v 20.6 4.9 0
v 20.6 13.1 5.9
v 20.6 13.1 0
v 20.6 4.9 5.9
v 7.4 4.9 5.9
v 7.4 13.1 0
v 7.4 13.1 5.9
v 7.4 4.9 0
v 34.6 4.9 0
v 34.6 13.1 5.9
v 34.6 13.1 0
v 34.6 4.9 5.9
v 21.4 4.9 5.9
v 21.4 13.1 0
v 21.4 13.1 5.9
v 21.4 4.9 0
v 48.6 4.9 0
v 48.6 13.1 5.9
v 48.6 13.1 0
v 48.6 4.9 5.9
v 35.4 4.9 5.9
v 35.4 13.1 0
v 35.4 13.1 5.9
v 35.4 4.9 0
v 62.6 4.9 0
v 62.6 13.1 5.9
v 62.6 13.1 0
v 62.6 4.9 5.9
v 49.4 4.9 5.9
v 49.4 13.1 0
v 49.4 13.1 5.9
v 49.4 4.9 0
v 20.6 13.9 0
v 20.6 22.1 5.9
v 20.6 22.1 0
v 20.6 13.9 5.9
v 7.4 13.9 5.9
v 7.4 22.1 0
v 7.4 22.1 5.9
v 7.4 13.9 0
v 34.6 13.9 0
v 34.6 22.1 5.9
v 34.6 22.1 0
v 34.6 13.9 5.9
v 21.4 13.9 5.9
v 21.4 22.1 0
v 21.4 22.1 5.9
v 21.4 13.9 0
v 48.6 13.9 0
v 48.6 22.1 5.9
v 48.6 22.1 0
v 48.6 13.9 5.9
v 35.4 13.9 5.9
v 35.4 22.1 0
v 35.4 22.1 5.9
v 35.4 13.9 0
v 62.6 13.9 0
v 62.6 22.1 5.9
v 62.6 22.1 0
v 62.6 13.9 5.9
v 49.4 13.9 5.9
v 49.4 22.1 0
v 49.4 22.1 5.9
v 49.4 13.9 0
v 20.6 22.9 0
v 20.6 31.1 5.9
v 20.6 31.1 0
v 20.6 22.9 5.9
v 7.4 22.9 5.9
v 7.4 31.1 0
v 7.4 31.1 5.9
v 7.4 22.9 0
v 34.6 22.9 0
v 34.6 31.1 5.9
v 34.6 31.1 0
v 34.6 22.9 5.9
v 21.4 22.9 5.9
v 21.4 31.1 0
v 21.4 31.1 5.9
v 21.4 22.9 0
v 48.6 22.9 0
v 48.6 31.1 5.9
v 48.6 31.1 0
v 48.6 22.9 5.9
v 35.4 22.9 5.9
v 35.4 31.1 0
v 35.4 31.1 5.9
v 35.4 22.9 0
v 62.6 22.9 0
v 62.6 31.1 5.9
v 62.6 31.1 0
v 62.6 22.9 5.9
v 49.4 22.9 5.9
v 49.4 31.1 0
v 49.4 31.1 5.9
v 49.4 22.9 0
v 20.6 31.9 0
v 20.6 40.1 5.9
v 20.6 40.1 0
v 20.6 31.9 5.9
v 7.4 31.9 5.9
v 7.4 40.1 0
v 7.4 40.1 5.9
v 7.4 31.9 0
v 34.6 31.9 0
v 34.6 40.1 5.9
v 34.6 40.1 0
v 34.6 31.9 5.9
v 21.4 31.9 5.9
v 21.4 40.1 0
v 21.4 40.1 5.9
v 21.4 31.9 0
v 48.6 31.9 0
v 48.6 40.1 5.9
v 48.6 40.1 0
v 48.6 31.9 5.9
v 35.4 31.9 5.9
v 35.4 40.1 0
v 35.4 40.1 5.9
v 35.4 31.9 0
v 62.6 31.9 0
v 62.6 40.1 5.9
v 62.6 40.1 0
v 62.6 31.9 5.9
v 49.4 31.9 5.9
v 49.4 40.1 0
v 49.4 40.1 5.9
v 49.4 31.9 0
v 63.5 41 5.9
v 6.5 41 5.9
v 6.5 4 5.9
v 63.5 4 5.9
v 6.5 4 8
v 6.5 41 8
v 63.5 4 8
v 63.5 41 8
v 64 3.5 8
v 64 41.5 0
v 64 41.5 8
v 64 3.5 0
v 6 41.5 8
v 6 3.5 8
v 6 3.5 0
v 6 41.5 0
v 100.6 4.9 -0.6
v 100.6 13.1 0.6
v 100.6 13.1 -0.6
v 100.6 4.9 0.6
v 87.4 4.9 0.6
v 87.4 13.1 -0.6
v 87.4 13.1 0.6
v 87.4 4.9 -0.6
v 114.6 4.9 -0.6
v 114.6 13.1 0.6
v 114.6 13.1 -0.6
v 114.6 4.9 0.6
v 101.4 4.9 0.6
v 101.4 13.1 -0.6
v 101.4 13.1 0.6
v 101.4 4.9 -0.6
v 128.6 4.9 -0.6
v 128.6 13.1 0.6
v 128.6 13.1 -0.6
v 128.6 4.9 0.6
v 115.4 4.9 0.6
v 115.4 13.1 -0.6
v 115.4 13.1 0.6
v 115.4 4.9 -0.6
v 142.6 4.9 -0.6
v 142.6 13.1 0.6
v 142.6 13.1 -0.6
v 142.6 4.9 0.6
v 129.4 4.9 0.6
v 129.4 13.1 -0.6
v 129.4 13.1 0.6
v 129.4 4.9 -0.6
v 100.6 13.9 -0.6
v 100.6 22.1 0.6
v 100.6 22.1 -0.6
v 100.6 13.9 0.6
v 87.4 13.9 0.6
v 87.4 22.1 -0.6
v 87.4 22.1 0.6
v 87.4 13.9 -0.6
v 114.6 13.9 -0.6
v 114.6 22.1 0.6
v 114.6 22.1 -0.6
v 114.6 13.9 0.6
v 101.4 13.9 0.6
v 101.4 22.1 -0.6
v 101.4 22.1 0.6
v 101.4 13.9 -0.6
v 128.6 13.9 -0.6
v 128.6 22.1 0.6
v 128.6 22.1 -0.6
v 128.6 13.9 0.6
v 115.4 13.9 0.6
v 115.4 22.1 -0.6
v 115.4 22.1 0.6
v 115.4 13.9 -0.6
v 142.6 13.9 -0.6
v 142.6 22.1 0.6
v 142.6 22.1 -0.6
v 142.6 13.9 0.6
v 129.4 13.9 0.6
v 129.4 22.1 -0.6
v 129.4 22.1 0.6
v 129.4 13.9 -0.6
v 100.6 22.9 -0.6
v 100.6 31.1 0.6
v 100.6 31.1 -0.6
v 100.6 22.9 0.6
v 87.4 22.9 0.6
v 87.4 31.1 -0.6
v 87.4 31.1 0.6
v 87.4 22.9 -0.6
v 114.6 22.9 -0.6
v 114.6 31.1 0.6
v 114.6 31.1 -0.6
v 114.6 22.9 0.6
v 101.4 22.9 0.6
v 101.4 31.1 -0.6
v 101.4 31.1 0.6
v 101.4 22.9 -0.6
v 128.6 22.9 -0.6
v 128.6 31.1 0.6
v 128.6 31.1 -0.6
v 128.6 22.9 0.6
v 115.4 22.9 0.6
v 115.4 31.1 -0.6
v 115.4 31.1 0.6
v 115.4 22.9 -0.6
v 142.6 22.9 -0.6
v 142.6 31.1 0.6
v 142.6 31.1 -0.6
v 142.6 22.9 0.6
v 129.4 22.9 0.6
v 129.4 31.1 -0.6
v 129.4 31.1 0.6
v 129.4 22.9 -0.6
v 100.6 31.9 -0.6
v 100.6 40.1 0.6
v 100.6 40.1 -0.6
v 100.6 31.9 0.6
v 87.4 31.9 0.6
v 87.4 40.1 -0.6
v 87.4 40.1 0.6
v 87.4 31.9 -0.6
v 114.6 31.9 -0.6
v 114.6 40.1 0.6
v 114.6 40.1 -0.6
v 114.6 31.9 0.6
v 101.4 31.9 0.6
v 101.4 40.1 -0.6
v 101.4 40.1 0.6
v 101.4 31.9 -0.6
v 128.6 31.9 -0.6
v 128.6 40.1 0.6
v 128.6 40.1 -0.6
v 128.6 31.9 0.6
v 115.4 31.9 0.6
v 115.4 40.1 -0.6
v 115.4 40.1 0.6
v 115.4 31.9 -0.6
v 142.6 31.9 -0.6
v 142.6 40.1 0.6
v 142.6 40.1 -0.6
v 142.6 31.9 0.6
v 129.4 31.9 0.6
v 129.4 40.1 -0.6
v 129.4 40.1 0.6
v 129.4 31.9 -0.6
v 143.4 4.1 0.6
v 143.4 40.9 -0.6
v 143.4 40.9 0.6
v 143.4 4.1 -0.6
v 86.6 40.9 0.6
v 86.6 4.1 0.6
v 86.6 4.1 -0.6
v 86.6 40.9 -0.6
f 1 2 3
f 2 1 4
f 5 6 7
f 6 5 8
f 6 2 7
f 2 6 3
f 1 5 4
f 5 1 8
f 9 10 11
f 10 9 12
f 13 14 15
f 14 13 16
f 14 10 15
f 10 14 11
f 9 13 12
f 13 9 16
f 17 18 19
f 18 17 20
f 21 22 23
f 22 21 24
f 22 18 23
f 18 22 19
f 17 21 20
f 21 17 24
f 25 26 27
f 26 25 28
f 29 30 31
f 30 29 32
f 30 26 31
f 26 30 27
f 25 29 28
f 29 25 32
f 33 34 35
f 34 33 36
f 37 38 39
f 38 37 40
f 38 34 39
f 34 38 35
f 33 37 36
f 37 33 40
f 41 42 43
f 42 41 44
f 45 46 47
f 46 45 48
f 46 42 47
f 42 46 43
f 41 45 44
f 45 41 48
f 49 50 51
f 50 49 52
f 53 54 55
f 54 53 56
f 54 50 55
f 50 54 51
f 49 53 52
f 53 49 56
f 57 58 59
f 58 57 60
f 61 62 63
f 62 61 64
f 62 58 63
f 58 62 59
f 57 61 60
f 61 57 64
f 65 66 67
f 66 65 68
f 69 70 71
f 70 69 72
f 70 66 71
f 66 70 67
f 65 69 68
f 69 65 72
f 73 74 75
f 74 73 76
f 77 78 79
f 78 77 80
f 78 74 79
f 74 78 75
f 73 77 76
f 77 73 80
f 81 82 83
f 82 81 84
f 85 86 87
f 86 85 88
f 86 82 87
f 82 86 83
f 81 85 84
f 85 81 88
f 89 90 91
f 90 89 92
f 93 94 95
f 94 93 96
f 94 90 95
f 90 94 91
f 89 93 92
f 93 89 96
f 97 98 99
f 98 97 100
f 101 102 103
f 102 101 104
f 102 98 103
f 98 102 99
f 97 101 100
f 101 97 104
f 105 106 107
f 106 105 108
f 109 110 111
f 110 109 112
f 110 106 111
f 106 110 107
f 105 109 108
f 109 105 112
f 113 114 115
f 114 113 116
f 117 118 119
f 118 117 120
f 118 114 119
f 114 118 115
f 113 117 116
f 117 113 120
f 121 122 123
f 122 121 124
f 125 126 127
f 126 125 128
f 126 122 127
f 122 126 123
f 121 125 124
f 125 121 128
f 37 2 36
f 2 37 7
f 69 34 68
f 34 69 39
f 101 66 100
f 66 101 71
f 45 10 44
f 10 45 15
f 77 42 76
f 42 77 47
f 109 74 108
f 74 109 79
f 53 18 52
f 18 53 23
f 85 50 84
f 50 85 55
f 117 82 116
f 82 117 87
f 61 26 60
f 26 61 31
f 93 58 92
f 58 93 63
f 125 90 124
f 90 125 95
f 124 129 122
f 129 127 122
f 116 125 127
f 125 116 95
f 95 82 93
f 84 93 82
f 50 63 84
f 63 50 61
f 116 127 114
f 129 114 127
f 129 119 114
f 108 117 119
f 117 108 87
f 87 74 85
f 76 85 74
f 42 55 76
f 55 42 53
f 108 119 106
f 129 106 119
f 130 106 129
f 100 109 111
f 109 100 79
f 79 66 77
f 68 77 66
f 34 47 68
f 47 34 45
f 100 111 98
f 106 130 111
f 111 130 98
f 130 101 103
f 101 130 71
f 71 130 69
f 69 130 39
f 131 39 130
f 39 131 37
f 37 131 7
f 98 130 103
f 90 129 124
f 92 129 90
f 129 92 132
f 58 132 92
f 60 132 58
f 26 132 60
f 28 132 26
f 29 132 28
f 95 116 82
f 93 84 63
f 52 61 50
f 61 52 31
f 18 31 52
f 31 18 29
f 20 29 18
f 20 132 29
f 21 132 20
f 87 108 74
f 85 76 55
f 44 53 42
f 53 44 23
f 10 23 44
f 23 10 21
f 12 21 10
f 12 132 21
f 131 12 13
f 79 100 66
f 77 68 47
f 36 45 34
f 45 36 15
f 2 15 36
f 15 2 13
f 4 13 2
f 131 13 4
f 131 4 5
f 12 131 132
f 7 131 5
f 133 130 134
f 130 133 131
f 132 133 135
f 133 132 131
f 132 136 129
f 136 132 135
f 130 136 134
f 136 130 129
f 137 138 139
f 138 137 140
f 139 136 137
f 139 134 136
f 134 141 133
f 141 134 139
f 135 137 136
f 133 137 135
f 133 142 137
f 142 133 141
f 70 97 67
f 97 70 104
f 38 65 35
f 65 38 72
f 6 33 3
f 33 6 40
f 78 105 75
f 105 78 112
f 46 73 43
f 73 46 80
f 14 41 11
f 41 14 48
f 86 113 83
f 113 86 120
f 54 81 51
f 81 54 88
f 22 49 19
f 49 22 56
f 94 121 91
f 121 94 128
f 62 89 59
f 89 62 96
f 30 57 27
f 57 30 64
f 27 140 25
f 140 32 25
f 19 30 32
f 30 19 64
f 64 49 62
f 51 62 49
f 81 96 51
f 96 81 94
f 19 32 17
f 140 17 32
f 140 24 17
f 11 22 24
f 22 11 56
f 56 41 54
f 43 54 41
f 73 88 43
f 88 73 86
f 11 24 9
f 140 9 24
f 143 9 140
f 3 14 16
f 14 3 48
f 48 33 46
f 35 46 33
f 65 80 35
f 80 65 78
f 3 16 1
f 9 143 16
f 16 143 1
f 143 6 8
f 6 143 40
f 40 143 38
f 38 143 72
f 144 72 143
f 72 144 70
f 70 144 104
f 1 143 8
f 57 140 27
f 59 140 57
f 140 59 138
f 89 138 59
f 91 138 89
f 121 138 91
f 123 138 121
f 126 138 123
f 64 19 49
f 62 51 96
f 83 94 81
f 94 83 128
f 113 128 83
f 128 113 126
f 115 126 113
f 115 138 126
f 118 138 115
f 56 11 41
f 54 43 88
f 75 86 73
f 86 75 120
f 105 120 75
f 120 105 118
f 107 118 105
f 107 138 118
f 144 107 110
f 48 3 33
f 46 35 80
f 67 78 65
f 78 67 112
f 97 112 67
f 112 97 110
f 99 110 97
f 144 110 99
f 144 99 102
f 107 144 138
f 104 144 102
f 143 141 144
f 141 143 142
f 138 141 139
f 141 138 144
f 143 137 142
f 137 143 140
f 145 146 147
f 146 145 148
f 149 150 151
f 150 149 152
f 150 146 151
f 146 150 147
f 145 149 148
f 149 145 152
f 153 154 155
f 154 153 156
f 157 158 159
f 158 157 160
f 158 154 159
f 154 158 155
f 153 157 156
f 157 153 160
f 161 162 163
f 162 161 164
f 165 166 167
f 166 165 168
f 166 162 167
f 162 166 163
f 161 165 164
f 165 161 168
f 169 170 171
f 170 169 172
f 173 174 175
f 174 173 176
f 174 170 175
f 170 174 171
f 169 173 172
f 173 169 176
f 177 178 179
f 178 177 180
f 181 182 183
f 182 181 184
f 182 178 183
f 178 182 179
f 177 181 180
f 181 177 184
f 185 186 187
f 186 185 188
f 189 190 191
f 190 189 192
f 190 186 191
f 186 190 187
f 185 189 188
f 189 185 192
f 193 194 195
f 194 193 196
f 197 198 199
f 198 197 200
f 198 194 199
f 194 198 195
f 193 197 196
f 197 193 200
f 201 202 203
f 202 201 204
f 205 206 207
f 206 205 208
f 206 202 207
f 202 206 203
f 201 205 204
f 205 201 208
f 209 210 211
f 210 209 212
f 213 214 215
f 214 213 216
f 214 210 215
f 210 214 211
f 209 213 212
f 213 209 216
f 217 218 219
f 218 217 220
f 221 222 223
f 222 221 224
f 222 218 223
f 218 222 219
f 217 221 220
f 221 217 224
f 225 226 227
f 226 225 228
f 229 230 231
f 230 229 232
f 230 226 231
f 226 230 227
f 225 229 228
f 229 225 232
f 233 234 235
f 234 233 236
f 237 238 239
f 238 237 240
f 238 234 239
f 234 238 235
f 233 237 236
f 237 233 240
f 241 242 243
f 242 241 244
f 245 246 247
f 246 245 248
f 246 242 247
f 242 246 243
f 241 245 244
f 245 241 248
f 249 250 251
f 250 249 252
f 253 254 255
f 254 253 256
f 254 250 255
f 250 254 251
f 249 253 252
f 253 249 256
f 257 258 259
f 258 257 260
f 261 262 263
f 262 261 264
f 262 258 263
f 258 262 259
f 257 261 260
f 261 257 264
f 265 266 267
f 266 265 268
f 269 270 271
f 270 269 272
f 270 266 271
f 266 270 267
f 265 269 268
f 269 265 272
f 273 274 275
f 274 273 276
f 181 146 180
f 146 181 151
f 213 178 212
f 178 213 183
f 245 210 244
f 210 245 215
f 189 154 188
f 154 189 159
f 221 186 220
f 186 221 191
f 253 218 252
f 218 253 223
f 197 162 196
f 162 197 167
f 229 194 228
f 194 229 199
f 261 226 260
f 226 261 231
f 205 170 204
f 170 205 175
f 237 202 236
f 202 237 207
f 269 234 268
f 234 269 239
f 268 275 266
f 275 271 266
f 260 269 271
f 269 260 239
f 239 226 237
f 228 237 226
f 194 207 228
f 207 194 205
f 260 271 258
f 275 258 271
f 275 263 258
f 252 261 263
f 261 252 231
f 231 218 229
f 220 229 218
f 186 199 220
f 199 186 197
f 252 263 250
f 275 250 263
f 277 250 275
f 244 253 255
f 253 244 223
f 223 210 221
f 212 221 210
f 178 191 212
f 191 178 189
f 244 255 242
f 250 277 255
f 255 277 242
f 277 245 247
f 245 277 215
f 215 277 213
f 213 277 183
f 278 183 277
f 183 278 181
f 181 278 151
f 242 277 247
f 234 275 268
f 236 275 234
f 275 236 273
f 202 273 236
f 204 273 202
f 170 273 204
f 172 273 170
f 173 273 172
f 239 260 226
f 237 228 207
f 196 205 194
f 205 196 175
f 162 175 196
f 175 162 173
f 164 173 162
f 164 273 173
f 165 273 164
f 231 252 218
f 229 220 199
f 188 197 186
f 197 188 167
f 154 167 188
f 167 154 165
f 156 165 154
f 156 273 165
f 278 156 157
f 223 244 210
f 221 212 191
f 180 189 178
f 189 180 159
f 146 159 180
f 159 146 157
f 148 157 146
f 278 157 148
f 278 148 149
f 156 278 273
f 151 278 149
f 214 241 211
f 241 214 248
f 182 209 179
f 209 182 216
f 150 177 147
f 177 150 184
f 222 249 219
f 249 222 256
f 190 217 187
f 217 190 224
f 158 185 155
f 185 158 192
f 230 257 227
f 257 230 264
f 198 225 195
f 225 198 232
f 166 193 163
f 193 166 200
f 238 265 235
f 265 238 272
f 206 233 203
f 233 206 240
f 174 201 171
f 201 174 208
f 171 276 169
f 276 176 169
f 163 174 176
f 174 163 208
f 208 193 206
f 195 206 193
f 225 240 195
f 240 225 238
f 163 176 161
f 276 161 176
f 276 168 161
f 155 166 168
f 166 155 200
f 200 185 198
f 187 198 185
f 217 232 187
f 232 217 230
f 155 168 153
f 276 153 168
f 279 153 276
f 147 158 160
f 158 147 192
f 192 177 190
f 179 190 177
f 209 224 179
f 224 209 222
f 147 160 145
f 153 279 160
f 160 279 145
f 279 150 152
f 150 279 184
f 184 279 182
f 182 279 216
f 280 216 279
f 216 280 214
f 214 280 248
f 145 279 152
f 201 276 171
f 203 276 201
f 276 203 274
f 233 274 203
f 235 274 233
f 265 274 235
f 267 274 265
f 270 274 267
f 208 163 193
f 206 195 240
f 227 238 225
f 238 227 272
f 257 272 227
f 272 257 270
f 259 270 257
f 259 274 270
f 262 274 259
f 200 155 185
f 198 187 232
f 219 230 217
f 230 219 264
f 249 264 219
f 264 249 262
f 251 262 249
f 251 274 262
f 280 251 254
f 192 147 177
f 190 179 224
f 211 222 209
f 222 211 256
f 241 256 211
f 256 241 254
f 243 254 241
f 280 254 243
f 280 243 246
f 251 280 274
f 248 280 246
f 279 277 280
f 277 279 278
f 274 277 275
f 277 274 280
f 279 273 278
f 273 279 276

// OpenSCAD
//14 9
WallThickness = 0.8;
StepThickness = 1.8;
Height = 8;
StepHeight = 1.6;

CoverHeight = 1.2;

translate([0,0,Height/2])
difference() {
  translate([35,22.5,0]) cube(size = [58,38,Height], center = true);
    
  for ( j = [1 : 1 : 4] ){  
    for ( i = [1 : 1 : 4] ){
    translate([i*14,j*9,0]) cube(size = [14-WallThickness,9-WallThickness,Height+1], center = true);
    
    }
  }  
  for ( j = [1 : 1 : 4] ){  
    for ( i = [1 : 1 : 4] ){
    translate([i*14,j*9,Height-StepHeight]) cube(size = [14-WallThickness+StepThickness,9-WallThickness+StepThickness,Height+1], center = true);
    
    }
  }  
}

//translate([80,0,CoverHeight/2+Height-CoverHeight])
translate([80,0,0])
difference() {
  translate([35,22.5,0]) cube(size = [58-1.2,38-1.2,CoverHeight], center = true);
    
  for ( j = [1 : 1 : 4] ){  
    for ( i = [1 : 1 : 4] ){
    translate([i*14,j*9,0]) cube(size = [14-WallThickness,9-WallThickness,CoverHeight+1], center = true);
    
    }
  }  
  
}
